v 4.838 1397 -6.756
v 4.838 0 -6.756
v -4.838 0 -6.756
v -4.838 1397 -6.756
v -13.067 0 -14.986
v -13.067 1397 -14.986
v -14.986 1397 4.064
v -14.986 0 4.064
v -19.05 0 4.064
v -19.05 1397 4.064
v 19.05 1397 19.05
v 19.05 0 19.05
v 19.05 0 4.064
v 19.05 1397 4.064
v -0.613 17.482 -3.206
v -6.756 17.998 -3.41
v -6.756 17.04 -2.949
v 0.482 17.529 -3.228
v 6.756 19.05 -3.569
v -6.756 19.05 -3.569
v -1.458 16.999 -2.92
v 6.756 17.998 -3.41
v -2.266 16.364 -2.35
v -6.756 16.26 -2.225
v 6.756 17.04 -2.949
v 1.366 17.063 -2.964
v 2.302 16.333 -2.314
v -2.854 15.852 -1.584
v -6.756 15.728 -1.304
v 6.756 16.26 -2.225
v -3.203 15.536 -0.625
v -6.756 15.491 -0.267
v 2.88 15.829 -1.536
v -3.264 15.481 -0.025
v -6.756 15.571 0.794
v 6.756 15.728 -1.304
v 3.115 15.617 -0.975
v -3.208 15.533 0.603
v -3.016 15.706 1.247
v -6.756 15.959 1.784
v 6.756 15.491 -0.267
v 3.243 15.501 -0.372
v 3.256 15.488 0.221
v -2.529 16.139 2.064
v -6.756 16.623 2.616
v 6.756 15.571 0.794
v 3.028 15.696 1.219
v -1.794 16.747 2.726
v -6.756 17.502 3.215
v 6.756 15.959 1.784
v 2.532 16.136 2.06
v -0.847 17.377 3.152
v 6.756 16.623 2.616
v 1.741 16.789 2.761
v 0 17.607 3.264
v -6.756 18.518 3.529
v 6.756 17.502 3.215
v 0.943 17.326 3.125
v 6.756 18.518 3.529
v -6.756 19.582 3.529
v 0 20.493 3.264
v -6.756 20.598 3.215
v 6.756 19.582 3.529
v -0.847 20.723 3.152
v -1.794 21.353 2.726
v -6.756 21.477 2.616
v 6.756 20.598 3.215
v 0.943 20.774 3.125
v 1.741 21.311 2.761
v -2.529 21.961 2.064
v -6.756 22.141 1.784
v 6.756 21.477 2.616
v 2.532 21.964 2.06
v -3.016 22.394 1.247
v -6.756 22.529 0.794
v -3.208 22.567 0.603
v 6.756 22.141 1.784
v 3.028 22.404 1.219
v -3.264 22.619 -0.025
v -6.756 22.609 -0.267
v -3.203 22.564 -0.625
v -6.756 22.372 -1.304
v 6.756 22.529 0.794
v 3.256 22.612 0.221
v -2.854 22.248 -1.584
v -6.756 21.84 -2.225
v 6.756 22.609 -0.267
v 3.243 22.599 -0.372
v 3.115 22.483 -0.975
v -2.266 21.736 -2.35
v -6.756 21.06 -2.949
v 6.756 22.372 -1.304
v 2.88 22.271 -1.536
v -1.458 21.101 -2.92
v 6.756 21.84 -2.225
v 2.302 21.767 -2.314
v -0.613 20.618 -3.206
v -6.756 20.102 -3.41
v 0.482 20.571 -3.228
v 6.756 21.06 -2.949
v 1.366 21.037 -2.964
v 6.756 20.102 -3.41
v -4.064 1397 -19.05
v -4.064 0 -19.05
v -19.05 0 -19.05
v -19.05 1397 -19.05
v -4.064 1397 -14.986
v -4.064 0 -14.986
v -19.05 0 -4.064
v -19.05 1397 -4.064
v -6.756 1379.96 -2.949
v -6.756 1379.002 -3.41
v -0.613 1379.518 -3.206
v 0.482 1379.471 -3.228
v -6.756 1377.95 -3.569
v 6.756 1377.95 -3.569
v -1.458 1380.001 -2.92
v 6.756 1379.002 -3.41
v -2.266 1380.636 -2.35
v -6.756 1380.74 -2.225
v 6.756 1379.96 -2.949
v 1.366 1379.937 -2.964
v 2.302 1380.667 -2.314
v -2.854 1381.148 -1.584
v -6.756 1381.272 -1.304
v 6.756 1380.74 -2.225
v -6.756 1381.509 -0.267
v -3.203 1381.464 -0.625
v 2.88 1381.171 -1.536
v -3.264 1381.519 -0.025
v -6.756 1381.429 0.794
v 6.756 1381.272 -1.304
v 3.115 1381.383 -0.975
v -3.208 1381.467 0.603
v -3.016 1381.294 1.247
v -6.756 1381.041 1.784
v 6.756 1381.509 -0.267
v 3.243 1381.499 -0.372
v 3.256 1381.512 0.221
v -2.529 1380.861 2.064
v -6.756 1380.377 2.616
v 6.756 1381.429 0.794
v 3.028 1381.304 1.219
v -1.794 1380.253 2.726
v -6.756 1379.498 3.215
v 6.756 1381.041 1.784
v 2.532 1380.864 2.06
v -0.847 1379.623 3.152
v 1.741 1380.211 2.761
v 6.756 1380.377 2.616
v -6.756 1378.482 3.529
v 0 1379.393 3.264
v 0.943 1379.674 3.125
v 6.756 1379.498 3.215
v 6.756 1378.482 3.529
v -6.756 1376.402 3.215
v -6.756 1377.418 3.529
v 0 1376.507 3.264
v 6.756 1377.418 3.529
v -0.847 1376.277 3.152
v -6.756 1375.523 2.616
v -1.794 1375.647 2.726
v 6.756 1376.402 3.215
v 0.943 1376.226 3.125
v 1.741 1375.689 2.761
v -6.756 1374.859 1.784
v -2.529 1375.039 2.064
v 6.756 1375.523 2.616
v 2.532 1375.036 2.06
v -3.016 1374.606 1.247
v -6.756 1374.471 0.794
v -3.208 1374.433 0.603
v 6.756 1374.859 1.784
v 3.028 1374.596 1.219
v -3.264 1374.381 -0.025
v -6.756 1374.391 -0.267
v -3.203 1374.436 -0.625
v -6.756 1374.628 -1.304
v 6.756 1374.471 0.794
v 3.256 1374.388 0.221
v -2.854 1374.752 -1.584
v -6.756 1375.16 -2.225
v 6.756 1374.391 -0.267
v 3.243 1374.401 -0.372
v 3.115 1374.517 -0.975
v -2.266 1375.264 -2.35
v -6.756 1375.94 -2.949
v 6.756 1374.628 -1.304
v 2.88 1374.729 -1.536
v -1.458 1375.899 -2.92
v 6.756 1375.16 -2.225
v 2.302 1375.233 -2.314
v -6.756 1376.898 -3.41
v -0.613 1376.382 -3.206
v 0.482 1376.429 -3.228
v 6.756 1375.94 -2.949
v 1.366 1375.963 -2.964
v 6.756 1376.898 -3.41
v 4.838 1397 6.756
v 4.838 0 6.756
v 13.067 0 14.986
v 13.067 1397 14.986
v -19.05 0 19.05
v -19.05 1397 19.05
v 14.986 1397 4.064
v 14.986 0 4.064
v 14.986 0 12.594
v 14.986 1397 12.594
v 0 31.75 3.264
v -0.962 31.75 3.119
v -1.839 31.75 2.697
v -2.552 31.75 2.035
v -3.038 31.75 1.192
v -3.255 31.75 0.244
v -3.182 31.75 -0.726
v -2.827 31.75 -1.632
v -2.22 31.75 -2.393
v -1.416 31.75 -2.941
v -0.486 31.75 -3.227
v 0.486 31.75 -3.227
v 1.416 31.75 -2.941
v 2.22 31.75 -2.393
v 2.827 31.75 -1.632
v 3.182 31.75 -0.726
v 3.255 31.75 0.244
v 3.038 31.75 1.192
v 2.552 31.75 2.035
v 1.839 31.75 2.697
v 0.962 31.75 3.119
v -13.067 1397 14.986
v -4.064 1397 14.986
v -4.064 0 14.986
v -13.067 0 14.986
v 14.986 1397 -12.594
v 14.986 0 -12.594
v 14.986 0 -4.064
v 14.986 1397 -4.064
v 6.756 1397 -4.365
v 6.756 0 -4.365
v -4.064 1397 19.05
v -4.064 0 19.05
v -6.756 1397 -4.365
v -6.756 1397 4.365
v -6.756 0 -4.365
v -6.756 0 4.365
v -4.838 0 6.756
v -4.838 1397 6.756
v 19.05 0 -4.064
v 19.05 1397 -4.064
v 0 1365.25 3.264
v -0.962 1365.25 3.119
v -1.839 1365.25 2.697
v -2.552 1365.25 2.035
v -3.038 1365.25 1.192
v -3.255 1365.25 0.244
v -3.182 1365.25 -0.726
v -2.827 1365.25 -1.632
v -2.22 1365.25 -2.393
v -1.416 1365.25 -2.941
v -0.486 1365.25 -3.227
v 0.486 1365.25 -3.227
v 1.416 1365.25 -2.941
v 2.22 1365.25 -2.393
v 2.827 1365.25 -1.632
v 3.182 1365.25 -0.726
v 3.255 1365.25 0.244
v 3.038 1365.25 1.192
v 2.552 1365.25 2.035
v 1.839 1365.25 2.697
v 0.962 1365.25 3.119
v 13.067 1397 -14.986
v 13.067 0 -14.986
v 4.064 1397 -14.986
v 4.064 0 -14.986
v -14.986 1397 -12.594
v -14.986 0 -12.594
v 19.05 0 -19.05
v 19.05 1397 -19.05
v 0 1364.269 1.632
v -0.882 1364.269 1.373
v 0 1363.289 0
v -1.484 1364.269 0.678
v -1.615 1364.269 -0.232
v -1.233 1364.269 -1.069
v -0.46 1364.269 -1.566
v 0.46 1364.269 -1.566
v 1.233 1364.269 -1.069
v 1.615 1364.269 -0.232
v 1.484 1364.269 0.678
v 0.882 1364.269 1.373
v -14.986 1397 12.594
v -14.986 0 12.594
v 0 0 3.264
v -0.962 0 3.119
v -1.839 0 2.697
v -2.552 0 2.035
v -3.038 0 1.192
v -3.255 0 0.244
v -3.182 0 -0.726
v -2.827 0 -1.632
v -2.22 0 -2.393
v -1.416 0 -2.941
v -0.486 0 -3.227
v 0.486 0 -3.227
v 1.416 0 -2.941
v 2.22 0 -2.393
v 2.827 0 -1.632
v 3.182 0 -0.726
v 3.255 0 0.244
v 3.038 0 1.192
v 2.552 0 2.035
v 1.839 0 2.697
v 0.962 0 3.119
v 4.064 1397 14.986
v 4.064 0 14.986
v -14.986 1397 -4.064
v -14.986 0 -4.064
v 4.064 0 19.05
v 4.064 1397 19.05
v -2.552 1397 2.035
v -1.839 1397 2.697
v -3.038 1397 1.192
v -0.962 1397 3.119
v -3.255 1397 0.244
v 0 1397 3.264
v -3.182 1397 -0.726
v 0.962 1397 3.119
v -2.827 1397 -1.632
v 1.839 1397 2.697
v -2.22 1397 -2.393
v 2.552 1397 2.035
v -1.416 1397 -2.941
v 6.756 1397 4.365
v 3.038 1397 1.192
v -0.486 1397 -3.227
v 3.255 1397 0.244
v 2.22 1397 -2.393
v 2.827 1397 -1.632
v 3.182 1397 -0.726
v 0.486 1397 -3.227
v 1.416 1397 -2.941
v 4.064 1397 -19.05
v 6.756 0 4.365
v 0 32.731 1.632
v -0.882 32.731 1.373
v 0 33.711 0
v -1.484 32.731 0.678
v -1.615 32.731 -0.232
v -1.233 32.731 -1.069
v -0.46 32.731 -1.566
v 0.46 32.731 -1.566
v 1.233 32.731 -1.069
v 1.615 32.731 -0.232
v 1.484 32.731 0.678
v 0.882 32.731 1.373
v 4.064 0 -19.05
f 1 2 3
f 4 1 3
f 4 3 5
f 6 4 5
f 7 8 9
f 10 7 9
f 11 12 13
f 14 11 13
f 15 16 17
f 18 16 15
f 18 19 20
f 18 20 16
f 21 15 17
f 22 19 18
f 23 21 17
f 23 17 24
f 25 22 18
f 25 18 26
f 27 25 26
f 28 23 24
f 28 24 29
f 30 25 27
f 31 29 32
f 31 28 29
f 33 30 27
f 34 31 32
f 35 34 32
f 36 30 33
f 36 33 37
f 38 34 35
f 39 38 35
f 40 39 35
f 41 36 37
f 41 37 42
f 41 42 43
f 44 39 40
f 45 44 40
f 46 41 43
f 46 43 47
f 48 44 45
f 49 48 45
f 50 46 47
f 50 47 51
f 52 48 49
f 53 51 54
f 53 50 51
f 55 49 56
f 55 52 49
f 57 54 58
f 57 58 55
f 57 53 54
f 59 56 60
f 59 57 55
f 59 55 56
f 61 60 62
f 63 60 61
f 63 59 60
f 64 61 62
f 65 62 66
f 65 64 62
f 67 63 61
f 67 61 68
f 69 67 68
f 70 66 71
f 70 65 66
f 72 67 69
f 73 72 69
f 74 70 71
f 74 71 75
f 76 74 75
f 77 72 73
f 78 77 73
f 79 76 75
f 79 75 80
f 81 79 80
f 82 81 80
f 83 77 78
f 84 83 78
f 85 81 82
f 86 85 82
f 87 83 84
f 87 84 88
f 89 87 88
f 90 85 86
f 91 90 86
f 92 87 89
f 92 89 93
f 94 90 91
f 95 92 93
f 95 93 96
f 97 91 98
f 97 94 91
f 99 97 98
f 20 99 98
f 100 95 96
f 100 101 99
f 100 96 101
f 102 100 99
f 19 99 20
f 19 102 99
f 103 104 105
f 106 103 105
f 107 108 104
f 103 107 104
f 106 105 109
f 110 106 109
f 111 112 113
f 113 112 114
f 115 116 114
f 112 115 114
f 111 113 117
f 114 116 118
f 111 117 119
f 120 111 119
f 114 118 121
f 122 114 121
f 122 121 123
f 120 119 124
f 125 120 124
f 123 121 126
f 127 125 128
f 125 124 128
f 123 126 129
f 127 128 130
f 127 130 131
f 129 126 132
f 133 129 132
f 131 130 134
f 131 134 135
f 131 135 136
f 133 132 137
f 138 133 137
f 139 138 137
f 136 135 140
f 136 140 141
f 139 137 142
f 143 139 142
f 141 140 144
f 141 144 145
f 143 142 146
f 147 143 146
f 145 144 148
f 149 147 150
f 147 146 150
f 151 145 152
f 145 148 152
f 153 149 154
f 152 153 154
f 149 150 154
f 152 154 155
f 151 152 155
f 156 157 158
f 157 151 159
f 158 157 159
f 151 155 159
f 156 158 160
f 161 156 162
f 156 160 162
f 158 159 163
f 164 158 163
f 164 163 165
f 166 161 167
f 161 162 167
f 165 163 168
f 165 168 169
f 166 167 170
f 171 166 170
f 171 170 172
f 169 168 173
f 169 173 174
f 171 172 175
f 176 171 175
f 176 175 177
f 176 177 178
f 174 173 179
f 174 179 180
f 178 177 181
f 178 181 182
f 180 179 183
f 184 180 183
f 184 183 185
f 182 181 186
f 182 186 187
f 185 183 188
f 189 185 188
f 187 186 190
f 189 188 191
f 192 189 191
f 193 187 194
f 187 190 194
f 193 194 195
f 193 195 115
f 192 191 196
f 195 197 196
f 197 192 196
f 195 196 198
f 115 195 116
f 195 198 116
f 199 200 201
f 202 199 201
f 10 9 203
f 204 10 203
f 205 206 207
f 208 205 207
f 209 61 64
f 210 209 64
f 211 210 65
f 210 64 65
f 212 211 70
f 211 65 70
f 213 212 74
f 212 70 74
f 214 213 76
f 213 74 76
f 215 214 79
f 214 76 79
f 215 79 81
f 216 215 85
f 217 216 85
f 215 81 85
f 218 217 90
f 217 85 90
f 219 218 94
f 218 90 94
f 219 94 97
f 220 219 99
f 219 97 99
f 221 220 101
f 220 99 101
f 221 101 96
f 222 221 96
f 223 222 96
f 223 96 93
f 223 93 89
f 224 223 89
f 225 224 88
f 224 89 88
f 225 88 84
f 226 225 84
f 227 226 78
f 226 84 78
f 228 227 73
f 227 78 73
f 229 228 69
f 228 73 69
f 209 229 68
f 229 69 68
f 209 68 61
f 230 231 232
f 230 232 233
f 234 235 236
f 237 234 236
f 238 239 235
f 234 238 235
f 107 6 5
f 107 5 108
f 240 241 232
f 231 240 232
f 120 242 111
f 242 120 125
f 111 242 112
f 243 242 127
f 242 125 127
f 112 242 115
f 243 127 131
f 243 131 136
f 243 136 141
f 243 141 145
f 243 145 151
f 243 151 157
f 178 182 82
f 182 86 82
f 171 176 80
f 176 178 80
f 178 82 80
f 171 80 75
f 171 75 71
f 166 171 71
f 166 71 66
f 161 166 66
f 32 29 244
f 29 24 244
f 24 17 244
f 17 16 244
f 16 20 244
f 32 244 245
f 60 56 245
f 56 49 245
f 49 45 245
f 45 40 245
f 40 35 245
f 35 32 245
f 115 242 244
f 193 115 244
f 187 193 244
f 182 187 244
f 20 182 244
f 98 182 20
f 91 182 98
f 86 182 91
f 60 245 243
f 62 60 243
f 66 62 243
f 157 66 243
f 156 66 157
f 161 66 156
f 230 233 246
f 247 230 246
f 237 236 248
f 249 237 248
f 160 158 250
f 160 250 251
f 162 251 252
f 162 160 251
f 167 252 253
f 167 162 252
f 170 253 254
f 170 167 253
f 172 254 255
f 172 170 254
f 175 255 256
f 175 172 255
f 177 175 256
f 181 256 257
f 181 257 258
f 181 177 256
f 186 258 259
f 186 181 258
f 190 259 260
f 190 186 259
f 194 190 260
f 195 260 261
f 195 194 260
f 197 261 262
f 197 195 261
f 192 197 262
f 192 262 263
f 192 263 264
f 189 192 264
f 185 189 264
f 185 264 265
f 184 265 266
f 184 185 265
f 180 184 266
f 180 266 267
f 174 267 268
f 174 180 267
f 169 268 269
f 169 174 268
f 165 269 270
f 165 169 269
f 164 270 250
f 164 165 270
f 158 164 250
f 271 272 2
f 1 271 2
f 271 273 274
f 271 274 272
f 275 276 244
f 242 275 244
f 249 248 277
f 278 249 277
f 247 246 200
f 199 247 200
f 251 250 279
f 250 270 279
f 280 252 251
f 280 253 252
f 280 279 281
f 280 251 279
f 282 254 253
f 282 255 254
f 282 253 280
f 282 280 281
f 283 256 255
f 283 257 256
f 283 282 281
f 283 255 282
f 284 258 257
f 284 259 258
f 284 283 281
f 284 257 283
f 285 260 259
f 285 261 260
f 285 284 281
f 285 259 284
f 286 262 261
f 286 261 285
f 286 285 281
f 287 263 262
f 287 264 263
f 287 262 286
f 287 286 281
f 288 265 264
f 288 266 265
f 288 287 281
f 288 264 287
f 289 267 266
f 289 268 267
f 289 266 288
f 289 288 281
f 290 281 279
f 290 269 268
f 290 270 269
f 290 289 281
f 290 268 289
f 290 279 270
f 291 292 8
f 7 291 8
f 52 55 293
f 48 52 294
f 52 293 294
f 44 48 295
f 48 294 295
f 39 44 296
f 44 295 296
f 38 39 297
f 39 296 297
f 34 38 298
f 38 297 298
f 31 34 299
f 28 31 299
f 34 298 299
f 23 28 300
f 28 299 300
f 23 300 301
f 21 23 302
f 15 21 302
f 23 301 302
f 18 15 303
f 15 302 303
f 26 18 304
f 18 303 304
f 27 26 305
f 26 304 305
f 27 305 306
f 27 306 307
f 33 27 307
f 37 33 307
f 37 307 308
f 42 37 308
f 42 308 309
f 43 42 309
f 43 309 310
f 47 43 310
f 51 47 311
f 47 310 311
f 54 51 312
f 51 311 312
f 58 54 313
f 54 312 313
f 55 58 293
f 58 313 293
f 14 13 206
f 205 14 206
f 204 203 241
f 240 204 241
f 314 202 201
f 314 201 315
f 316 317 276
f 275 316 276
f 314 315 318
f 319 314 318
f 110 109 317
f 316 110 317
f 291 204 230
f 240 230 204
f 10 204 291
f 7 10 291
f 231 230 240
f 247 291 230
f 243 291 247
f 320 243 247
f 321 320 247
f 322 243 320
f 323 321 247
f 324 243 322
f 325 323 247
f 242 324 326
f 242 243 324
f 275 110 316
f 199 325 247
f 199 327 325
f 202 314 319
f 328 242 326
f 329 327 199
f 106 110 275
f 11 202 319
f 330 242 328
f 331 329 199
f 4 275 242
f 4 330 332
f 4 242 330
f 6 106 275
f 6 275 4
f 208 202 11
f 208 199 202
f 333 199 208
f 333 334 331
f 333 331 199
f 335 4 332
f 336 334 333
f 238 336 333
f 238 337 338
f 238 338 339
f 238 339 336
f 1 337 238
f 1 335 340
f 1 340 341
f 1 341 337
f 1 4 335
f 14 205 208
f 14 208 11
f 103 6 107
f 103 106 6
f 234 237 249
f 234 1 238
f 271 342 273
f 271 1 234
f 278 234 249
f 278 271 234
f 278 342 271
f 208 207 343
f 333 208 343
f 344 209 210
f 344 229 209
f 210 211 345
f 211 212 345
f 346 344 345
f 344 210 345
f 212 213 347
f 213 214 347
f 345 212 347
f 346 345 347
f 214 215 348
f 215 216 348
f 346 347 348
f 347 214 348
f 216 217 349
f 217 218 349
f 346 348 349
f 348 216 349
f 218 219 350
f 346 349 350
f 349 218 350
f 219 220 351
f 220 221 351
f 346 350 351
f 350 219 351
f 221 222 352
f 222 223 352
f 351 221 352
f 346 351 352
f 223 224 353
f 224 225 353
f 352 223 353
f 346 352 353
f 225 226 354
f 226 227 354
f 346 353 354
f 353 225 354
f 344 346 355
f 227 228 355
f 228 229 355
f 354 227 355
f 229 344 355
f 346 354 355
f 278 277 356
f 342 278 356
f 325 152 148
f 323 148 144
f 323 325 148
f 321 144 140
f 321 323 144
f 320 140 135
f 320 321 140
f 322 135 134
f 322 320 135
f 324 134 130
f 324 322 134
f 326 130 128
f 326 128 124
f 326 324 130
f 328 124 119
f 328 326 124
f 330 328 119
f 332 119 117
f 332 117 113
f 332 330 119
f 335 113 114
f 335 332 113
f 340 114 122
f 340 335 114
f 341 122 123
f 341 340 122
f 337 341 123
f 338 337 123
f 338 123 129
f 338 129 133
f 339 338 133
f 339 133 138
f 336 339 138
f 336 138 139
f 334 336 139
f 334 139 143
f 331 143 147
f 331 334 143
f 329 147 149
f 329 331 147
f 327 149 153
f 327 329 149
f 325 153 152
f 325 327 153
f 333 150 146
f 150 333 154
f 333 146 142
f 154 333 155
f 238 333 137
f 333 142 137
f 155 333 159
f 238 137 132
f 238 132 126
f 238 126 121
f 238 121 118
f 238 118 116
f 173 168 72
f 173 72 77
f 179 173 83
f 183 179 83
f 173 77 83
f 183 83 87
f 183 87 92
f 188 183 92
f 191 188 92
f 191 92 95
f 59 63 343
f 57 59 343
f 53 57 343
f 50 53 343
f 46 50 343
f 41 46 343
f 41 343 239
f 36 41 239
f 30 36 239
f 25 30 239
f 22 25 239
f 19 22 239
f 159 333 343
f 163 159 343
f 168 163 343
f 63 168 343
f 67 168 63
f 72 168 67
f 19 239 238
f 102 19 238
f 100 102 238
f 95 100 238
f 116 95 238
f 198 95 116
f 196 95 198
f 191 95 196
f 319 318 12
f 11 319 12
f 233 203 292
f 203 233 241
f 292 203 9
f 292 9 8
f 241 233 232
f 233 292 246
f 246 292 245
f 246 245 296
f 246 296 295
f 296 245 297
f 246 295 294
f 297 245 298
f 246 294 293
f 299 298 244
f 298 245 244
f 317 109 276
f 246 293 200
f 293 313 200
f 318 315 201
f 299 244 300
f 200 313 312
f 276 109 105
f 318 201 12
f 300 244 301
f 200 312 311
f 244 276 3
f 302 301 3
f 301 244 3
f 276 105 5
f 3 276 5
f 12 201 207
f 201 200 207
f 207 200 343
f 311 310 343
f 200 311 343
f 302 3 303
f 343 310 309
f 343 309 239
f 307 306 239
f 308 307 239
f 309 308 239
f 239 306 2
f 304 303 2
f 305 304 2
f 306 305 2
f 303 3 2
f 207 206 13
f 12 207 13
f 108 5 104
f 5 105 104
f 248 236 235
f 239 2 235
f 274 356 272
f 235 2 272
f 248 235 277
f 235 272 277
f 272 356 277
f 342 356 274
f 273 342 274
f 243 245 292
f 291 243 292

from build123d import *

# Parameters (mm, degrees)
EXTRUDE1_DEPTH     = 1397
SKETCH2_R          = 3.5687
CUT_EXTRUDE1_DEPTH = 1398.649280936


# Read off the part's stored shape, not the designer's step: 1515<1>
with BuildPart() as part:
    # Sketch1<2> → Extrude1 (new body)
    with BuildSketch(Plane(origin=(0, 0, 0), x_dir=(1, 0, 0), z_dir=(0, 1, 0))):
        Polygon((-6.7564, 4.364749804), (-6.7564, -4.364749804), (-14.986, -12.594349804), (-14.986, -4.064), (-19.05, -4.064), (-19.05, -19.05), (-4.064, -19.05), (-4.064, -14.986), (-13.067127258, -14.986), (-4.837527258, -6.7564), (4.837527258, -6.7564), (13.067127258, -14.986), (4.064, -14.986), (4.064, -19.05), (19.05, -19.05), (19.05, -4.064), (14.986, -4.064), (14.986, -12.594349804), (6.7564, -4.364749804), (6.7564, 4.364749804), (14.986, 12.594349804), (14.986, 4.064), (19.05, 4.064), (19.05, 19.05), (4.064, 19.05), (4.064, 14.986), (13.067127258, 14.986), (4.837527258, 6.7564), (-4.837527258, 6.7564), (-13.067127258, 14.986), (-4.064, 14.986), (-4.064, 19.05), (-19.05, 19.05), (-19.05, 4.064), (-14.986, 4.064), (-14.986, 12.594349804), align=None)
    extrude(amount=EXTRUDE1_DEPTH)

    # Sketch2 → Cut-Extrude1 (cut, through all)
    with BuildSketch(Plane(origin=(19.05, 0, 0), x_dir=(0, 0, -1), z_dir=(1, 0, 0))):
        with Locations((0, 1377.95)):
            Circle(SKETCH2_R)
    cut_extrude1 = extrude(amount=-CUT_EXTRUDE1_DEPTH, mode=Mode.SUBTRACT)

    # Mirror1: Cut-Extrude1 across plane
    add(cut_extrude1.mirror(Plane.ZX.offset(698.5)), mode=Mode.SUBTRACT)

    # Sketch3 → 5/16-18 Tapped Hole1 (revolve, cut)
    with BuildSketch(Plane(origin=(0, 1397, 0), x_dir=(0, 0, 1), z_dir=(1, 0, 0))):
        Polygon((0, 0), (0, 33.711148974), (3.2639, 31.75), (3.2639, 0), align=None)
    f_5_16_18_tapped_hole1 = revolve(axis=Axis((0, 1403.35, 0), (0, -1, 0)), mode=Mode.SUBTRACT)

    # Mirror2: 5/16-18 Tapped Hole1 across plane
    add(f_5_16_18_tapped_hole1.mirror(Plane.ZX.offset(698.5)), mode=Mode.SUBTRACT)


solid = part.part
